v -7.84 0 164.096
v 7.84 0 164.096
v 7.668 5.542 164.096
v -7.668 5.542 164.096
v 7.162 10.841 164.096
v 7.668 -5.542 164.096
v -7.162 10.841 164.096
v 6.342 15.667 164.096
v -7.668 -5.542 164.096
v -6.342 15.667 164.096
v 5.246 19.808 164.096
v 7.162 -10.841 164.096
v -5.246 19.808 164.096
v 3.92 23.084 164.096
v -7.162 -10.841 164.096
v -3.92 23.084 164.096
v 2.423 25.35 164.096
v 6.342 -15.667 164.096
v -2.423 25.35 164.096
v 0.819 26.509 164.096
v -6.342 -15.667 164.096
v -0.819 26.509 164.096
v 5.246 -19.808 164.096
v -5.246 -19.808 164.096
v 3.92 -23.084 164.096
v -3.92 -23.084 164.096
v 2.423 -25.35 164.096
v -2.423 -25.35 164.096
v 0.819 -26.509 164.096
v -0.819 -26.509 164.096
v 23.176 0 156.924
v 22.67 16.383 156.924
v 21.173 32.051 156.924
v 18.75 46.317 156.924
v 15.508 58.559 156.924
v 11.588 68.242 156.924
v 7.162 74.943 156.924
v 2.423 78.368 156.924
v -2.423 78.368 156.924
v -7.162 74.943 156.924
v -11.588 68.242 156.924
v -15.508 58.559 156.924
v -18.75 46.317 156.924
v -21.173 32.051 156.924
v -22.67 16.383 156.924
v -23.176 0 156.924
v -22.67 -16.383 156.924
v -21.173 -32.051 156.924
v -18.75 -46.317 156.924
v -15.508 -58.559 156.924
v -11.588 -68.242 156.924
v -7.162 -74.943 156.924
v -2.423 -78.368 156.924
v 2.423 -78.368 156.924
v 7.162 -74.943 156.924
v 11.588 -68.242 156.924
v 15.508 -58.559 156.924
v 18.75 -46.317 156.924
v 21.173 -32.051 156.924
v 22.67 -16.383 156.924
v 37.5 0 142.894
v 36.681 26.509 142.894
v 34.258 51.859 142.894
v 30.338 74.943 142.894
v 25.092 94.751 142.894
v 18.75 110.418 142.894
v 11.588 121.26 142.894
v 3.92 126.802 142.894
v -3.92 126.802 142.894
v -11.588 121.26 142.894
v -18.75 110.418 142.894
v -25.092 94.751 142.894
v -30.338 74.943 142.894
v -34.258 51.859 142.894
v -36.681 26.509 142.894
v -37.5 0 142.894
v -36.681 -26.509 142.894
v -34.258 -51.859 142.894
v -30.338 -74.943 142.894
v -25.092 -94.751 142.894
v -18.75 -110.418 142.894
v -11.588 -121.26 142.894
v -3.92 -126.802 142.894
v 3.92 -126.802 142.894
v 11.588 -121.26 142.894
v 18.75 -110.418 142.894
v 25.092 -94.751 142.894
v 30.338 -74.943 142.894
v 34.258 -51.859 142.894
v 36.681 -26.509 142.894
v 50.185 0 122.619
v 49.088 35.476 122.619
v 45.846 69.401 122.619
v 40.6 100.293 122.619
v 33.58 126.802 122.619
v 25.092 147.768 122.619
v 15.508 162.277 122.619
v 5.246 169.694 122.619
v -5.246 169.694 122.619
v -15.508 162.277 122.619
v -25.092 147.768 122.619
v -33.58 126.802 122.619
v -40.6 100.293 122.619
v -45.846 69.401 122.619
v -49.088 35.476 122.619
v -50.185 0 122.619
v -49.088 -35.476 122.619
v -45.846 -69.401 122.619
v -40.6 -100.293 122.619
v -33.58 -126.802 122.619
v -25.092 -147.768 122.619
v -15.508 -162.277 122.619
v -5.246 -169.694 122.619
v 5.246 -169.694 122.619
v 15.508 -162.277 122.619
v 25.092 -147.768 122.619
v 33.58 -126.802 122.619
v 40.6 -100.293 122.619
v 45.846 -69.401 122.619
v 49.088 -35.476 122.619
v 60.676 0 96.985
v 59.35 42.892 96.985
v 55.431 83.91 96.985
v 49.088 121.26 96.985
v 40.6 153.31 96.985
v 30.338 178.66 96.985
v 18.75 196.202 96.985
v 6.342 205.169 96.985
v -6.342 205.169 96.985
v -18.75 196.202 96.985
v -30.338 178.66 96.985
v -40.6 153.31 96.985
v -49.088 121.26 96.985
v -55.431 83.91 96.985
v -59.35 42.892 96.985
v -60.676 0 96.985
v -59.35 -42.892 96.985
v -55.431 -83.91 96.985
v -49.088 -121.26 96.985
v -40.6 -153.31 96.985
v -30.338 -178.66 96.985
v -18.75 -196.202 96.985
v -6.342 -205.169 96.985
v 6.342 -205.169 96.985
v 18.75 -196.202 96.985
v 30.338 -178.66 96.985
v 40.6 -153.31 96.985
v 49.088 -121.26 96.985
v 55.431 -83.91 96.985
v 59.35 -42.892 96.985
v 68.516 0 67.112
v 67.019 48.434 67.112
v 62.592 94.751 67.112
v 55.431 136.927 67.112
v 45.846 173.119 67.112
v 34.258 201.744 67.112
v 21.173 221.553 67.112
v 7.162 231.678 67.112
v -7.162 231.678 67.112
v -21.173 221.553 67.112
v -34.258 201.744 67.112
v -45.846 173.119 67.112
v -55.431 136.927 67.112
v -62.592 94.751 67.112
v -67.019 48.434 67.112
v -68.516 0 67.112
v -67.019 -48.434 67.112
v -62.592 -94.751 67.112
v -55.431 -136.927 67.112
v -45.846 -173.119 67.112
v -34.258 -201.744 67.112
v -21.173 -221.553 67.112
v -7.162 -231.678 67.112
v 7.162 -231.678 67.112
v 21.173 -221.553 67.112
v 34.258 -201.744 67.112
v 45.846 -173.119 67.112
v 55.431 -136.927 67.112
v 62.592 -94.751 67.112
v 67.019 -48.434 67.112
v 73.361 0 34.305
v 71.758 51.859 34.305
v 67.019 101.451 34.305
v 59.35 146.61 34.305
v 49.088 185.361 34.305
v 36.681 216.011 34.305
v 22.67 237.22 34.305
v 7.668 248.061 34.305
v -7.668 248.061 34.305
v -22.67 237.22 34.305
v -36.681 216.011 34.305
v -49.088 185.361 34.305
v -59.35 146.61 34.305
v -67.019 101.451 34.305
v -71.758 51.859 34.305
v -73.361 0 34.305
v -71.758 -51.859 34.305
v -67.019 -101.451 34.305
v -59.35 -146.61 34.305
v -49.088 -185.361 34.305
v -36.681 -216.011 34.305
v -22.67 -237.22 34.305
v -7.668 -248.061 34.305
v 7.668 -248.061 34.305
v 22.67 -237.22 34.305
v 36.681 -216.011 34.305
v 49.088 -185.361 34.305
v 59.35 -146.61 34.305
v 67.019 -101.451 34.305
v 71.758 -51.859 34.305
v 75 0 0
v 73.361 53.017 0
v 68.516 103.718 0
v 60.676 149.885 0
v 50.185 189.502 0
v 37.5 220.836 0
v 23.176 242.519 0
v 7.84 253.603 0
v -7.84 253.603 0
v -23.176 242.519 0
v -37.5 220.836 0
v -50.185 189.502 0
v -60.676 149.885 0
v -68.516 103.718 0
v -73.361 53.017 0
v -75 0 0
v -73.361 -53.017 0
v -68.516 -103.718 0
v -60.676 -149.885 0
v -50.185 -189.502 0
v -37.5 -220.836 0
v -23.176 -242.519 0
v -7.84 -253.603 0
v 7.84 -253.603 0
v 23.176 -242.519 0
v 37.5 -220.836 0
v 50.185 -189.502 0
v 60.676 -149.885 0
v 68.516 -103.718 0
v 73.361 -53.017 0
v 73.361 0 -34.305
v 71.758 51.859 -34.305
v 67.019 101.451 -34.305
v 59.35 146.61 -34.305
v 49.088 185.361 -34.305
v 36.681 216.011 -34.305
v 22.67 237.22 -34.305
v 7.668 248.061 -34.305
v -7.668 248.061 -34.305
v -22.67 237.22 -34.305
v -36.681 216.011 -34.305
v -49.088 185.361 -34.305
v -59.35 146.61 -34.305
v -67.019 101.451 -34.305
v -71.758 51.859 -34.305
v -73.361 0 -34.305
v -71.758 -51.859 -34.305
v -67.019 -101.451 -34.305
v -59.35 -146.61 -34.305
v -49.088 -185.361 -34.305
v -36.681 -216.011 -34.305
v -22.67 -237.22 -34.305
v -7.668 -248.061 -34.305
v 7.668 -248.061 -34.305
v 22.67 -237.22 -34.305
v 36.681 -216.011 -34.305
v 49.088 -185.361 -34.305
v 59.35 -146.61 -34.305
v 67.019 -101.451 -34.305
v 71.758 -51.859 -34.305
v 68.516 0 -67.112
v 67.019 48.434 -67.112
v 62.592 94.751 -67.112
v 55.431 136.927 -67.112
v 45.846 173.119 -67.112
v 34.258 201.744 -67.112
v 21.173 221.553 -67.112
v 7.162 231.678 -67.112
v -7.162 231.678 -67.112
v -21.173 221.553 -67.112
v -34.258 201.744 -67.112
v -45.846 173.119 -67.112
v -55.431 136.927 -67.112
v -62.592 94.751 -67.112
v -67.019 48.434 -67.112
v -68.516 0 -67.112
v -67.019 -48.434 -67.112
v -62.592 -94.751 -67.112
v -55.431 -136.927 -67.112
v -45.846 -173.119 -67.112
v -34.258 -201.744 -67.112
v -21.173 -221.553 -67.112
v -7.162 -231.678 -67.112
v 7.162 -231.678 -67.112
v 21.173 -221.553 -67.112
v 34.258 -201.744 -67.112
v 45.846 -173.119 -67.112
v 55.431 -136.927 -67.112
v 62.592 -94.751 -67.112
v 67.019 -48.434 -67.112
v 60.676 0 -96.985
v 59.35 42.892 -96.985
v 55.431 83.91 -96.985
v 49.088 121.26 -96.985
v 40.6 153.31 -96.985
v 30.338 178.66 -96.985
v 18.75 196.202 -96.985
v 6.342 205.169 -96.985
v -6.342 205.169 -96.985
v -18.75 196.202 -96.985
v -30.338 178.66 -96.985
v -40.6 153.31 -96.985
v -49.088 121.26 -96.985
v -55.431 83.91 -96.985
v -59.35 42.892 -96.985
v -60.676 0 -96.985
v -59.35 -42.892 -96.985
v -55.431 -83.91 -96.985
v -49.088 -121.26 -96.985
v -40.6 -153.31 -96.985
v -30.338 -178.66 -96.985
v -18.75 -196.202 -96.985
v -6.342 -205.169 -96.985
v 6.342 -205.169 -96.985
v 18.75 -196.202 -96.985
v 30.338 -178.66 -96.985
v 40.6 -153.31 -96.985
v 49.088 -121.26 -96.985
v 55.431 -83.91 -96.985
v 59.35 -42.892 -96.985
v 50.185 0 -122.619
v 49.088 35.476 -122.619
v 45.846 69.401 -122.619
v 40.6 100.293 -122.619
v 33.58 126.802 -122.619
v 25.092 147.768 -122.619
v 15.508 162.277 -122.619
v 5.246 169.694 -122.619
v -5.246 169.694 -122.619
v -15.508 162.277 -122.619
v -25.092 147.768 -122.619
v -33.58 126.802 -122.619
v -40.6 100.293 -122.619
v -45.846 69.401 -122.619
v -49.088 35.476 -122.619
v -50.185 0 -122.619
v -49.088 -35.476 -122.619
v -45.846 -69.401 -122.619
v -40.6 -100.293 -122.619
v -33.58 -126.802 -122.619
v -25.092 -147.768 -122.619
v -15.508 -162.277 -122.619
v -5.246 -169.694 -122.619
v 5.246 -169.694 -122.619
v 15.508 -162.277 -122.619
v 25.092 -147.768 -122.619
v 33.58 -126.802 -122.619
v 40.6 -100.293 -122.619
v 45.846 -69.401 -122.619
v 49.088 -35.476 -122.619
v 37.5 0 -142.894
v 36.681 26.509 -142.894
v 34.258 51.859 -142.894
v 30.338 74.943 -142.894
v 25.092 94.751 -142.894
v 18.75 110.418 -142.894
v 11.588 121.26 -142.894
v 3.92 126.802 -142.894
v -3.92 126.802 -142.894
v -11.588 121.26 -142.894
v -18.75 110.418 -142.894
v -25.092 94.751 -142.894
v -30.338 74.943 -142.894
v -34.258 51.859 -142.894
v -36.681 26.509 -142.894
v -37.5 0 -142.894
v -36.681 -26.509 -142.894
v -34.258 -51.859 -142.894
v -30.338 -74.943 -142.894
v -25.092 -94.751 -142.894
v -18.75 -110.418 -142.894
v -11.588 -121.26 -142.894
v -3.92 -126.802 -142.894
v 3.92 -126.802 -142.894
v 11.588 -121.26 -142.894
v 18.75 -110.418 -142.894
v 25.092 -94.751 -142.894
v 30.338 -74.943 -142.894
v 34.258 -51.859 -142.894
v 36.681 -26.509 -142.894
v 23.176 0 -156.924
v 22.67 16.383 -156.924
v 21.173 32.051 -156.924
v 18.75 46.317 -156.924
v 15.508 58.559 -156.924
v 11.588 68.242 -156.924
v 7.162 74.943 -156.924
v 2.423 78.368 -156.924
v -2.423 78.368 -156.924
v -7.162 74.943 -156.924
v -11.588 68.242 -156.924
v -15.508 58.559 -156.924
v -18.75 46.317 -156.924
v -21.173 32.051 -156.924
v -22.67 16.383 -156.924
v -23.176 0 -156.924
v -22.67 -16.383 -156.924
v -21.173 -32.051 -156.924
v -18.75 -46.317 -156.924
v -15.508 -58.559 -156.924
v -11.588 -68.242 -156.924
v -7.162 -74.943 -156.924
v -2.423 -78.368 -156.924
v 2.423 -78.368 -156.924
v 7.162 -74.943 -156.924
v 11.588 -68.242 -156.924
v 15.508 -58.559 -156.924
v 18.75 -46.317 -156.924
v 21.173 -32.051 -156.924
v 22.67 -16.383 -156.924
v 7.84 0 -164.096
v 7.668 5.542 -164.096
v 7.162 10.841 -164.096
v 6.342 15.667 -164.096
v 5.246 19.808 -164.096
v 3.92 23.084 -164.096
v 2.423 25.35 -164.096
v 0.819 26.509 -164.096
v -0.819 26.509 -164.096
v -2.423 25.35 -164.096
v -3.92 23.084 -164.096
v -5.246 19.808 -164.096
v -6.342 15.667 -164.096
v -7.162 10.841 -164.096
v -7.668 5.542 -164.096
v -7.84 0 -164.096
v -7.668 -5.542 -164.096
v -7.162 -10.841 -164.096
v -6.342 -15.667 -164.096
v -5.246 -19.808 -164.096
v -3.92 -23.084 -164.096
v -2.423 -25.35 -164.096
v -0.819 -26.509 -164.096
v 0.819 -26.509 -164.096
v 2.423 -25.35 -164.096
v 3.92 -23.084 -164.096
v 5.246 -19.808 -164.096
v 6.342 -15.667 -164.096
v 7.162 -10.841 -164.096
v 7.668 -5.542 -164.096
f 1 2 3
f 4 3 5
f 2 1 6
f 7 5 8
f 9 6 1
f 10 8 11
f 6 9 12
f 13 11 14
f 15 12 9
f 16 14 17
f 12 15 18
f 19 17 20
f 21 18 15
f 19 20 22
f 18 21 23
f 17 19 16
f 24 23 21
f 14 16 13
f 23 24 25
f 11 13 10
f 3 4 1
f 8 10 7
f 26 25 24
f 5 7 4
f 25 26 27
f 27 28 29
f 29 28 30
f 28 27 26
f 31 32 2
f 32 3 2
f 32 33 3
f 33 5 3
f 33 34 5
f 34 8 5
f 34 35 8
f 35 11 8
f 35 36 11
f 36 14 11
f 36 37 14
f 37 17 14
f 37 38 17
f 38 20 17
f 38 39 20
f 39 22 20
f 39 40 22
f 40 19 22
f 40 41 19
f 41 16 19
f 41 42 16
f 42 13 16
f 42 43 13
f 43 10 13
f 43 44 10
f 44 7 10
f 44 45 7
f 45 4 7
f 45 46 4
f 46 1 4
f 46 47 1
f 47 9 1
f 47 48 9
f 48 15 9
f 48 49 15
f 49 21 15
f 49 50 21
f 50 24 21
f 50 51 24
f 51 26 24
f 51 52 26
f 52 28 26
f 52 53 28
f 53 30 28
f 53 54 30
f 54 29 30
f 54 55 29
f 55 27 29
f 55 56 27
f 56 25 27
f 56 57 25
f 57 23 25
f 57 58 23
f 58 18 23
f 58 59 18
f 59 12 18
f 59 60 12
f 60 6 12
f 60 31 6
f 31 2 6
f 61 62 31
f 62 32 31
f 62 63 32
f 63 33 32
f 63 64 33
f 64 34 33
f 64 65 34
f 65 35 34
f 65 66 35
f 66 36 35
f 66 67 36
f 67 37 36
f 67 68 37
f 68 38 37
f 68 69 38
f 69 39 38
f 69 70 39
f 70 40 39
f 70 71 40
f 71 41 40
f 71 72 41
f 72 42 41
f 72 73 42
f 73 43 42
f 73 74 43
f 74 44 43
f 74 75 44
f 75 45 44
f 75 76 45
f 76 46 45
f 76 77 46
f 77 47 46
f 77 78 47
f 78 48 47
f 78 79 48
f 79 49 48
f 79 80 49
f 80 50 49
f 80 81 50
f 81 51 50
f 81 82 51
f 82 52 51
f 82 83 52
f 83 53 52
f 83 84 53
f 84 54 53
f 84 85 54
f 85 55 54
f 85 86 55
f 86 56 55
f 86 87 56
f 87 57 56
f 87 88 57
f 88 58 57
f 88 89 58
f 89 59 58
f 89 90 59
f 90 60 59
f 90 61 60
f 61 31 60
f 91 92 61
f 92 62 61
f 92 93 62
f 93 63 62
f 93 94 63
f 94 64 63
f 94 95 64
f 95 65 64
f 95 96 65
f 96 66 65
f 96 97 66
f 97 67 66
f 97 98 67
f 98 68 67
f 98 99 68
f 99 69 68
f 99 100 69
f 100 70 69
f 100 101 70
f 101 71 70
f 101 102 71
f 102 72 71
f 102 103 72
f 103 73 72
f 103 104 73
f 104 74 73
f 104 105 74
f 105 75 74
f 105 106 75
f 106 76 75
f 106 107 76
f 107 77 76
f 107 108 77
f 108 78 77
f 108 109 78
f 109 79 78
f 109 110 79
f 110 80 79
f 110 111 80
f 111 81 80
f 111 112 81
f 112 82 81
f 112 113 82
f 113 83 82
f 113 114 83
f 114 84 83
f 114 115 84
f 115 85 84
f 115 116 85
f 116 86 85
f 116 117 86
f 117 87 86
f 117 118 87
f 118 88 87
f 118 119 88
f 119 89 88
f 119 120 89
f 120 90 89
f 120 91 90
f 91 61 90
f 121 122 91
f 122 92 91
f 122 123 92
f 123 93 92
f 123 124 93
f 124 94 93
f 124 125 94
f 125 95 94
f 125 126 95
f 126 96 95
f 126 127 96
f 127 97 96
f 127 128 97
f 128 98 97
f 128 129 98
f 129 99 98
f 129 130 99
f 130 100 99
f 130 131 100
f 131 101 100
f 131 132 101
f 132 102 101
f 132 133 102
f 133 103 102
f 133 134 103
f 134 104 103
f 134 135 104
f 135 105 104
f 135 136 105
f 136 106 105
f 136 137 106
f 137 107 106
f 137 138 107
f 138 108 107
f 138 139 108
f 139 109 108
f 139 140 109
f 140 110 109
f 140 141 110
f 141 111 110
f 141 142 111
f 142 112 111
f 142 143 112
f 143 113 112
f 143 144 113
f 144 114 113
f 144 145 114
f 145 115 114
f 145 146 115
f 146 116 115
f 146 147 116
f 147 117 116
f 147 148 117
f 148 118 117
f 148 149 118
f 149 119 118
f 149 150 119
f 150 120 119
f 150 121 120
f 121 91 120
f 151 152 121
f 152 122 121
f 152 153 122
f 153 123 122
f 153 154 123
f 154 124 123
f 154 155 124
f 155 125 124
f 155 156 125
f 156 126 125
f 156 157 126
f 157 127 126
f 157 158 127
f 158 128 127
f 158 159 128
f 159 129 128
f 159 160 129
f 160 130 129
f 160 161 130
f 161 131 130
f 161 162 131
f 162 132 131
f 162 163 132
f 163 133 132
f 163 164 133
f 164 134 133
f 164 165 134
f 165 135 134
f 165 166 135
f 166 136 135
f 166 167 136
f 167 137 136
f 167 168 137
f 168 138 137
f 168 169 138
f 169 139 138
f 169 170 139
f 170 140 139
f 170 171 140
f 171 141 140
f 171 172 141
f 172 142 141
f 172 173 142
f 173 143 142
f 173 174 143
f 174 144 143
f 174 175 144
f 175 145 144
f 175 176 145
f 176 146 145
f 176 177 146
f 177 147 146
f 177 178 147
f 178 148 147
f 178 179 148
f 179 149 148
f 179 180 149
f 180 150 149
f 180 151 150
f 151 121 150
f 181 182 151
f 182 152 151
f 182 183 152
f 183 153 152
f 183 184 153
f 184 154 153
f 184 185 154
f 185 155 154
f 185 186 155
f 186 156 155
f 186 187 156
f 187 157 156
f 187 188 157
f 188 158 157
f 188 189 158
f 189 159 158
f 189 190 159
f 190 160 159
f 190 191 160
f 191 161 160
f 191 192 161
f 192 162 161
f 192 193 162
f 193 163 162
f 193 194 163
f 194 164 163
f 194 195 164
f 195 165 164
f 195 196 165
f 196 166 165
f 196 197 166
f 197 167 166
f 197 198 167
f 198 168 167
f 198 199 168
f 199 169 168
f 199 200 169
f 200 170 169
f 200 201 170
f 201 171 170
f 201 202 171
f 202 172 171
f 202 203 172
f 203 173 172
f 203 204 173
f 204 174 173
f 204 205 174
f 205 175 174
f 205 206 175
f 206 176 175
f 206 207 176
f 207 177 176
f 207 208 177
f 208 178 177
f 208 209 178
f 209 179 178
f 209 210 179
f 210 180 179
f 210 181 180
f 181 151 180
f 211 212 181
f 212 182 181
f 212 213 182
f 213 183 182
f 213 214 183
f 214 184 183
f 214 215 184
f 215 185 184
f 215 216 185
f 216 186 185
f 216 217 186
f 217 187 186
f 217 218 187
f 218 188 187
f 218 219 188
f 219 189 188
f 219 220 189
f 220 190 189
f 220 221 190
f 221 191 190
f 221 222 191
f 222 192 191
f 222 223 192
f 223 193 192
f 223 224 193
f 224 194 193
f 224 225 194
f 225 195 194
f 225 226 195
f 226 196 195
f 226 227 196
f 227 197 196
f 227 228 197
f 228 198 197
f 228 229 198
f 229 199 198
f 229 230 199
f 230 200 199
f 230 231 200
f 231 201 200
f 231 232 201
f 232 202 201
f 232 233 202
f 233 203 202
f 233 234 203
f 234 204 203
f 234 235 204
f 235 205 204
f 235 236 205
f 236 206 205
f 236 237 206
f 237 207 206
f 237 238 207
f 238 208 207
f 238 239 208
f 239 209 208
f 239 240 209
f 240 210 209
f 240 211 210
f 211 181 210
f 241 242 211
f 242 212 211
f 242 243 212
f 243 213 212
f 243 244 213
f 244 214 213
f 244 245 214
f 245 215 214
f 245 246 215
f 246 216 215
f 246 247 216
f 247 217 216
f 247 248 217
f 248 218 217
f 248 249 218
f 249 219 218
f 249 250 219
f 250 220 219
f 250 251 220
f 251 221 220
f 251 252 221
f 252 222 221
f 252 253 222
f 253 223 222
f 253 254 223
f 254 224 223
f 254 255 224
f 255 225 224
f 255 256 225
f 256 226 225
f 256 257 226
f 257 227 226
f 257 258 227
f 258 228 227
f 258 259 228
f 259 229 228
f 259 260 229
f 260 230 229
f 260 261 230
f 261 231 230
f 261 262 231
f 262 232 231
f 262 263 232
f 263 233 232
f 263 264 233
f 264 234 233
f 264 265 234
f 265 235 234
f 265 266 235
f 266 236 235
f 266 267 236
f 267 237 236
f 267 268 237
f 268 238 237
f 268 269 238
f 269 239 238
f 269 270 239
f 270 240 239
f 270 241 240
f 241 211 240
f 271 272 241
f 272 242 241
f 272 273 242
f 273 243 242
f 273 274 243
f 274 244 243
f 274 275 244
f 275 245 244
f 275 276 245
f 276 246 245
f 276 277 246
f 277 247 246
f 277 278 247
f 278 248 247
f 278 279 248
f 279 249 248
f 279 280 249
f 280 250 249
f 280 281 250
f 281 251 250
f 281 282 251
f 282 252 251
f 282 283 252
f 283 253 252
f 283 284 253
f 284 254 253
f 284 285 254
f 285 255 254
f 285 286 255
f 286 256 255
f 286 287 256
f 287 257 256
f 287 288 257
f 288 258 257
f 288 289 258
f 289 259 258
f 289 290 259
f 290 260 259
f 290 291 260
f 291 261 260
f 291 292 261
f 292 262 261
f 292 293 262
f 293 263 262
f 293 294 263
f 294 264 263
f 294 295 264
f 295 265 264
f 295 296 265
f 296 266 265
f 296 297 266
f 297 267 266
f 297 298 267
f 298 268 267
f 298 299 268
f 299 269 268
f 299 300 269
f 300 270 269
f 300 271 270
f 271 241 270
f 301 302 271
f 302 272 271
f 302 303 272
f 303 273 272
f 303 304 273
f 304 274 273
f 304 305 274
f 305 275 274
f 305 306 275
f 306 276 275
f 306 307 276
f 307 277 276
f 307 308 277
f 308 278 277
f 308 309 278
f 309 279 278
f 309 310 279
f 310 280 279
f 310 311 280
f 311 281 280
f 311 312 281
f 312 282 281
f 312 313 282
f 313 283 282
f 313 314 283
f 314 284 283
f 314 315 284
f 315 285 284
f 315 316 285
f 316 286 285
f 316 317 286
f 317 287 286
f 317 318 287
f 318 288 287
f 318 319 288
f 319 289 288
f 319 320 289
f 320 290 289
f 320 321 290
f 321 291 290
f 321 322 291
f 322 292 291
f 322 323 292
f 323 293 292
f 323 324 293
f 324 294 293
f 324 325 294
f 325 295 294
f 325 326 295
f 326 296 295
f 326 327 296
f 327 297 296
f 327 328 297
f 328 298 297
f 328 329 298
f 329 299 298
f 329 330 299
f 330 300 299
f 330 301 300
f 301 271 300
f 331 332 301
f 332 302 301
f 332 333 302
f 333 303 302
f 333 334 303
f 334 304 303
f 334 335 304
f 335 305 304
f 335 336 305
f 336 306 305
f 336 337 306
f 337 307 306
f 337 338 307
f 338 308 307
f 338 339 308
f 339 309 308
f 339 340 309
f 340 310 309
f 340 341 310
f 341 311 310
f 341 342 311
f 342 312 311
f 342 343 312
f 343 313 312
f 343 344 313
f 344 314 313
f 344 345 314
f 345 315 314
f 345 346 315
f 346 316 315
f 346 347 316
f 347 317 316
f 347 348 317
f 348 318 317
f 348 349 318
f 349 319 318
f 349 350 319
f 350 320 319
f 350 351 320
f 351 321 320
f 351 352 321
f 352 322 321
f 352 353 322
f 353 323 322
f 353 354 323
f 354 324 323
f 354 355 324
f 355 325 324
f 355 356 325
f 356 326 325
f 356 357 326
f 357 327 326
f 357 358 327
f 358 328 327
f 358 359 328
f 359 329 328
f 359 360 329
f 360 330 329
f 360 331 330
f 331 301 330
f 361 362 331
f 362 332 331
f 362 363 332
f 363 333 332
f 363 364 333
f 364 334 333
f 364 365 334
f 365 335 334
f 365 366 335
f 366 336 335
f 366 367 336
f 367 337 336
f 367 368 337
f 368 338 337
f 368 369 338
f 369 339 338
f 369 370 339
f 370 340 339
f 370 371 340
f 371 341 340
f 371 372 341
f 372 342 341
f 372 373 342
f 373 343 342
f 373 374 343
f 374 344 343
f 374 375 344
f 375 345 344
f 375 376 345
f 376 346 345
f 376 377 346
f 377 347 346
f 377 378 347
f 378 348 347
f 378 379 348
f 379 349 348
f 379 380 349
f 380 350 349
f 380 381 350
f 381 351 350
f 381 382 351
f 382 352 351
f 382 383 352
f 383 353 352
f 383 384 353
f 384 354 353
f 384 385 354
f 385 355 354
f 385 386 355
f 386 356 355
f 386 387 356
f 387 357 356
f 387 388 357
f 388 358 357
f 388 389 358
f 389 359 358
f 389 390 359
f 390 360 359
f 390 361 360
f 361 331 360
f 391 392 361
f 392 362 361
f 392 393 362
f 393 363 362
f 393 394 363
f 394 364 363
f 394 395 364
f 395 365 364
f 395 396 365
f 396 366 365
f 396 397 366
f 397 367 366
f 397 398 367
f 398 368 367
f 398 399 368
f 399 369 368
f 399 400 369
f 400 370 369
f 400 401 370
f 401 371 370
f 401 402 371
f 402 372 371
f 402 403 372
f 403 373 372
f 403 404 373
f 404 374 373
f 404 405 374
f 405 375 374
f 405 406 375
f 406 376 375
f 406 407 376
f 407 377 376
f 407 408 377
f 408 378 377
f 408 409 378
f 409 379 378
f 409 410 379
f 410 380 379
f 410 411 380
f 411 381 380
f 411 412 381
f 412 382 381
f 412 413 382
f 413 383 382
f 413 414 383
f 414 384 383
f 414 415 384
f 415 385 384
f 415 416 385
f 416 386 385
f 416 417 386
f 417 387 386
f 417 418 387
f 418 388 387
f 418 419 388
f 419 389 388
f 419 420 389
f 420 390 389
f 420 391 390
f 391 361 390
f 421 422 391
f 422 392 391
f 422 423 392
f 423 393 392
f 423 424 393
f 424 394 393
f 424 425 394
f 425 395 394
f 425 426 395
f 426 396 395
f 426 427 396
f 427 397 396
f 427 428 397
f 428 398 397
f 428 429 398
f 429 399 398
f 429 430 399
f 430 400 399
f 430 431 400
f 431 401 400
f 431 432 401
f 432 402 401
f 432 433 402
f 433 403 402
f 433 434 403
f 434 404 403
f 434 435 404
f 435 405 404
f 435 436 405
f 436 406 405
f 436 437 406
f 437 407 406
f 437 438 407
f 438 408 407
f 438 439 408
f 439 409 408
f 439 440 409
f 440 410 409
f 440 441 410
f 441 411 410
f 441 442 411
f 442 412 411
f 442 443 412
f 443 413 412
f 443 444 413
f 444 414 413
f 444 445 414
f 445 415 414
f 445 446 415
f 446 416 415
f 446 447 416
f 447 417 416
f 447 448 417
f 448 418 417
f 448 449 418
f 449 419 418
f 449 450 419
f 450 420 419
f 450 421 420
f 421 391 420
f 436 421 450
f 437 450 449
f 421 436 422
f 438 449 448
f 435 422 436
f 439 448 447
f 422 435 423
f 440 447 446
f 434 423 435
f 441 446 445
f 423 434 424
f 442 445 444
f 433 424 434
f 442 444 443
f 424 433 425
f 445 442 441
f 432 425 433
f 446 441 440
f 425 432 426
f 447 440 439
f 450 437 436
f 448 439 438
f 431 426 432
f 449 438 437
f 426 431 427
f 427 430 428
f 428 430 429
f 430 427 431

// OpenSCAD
// Generated by SolidPython 1.0.1 on 2020-07-29 00:46:47


scale(v = [5, 17, 11]) {
	sphere(r = 15);
}
/***********************************************
*********      SolidPython code:      **********
************************************************
 
# import packages: SolidPython
from solid import *
from solid.utils import *
from itertools import chain, combinations, permutations


class Resize:

    def __init__(self, scad_file):
        self.scad_file = scad_file
        #self.scad_file = import_scad(scad_file)
        # cone/cylinder param:
        self.r1 = 0
        self.r2 = 0
        self.h = 0
        # rectangular prism param:
        self.w = 0
        self.l = 0
        # ellipse param:
        self.r = 0

    # import OpenScad code (file name corresponds to shape)


    # classify shape + parameters
    def assign(self, param1, param2, param3):
        if self.scad_file == 'cone.scad':
            self.r1 = param1
            self.r2 = param2
            self.h = param3
        elif self.scad_file == 'cylinder.scad':
            self.r1 = param1
            self.r2 = param2
            self.h = param3
        elif self.scad_file == 'rectangularPrism.scad':
            self.h = param1
            self.l = param2
            self.w = param3
        else:
            self.r = param1
            self.h = param2

    # resize parameters
    def iterate(self):
        x = range(3, 20, 2)
        i = 1
        if self.scad_file == 'cone.scad':
            tempList = list(permutations(x, 2))
            for temp in tempList:
                param1 = temp[0]
                param2 = temp[1]
                filepath = 'produced_scad_files/' + 'cone' + str(param1) + '_' + str(param2) + '_' + '.scad'
                scad_render_to_file(cylinder(h=param1, r1=param2, r2=0), filepath)

        elif self.scad_file == 'cylinder.scad':
            tempList = list(permutations(x, 3))
            for temp in tempList:
                param1 = temp[0]
                param2 = temp[1]
                filepath = 'produced_scad_files/' + 'cylinder' + str(param1) + '_' + str(param2) + '_' + '.scad'
                scad_render_to_file(cylinder(h=param1, r1=param2, r2=param2), filepath)

        elif self.scad_file == 'rectangularPrism.scad':
            tempList = list(permutations(x, 3))
            for temp in tempList:
                param1 = temp[0]
                param2 = temp[1]
                param3 = temp[2]
                filepath = 'produced_scad_files/' + 'rectangularPrism' + str(param1) + '_' + str(param2) + '_' + str(
                    param3) + '.scad'
                scad_render_to_file(cube(size=(param1, param2, param3)), filepath)

        elif self.scad_file == 'ellipse.scad':
            tempList = list(permutations(x, 4))
            for temp in tempList:
                param1 = temp[0]
                param2 = temp[1]
                param3 = temp[2]
                param4 = temp[3]
                filepath = 'produced_scad_files/' + 'ellipse' + str(param1) + '_' + str(param2) + '_' + str(param3) + '_' + str(param4) + '.scad'
                scad_render_to_file(scale([param1, param2, param3])(sphere(r=param4)), filepath)

    def render_to_scadfile(self):
        scad_render_to_file(scad, 'example.scad') 
 
************************************************/
